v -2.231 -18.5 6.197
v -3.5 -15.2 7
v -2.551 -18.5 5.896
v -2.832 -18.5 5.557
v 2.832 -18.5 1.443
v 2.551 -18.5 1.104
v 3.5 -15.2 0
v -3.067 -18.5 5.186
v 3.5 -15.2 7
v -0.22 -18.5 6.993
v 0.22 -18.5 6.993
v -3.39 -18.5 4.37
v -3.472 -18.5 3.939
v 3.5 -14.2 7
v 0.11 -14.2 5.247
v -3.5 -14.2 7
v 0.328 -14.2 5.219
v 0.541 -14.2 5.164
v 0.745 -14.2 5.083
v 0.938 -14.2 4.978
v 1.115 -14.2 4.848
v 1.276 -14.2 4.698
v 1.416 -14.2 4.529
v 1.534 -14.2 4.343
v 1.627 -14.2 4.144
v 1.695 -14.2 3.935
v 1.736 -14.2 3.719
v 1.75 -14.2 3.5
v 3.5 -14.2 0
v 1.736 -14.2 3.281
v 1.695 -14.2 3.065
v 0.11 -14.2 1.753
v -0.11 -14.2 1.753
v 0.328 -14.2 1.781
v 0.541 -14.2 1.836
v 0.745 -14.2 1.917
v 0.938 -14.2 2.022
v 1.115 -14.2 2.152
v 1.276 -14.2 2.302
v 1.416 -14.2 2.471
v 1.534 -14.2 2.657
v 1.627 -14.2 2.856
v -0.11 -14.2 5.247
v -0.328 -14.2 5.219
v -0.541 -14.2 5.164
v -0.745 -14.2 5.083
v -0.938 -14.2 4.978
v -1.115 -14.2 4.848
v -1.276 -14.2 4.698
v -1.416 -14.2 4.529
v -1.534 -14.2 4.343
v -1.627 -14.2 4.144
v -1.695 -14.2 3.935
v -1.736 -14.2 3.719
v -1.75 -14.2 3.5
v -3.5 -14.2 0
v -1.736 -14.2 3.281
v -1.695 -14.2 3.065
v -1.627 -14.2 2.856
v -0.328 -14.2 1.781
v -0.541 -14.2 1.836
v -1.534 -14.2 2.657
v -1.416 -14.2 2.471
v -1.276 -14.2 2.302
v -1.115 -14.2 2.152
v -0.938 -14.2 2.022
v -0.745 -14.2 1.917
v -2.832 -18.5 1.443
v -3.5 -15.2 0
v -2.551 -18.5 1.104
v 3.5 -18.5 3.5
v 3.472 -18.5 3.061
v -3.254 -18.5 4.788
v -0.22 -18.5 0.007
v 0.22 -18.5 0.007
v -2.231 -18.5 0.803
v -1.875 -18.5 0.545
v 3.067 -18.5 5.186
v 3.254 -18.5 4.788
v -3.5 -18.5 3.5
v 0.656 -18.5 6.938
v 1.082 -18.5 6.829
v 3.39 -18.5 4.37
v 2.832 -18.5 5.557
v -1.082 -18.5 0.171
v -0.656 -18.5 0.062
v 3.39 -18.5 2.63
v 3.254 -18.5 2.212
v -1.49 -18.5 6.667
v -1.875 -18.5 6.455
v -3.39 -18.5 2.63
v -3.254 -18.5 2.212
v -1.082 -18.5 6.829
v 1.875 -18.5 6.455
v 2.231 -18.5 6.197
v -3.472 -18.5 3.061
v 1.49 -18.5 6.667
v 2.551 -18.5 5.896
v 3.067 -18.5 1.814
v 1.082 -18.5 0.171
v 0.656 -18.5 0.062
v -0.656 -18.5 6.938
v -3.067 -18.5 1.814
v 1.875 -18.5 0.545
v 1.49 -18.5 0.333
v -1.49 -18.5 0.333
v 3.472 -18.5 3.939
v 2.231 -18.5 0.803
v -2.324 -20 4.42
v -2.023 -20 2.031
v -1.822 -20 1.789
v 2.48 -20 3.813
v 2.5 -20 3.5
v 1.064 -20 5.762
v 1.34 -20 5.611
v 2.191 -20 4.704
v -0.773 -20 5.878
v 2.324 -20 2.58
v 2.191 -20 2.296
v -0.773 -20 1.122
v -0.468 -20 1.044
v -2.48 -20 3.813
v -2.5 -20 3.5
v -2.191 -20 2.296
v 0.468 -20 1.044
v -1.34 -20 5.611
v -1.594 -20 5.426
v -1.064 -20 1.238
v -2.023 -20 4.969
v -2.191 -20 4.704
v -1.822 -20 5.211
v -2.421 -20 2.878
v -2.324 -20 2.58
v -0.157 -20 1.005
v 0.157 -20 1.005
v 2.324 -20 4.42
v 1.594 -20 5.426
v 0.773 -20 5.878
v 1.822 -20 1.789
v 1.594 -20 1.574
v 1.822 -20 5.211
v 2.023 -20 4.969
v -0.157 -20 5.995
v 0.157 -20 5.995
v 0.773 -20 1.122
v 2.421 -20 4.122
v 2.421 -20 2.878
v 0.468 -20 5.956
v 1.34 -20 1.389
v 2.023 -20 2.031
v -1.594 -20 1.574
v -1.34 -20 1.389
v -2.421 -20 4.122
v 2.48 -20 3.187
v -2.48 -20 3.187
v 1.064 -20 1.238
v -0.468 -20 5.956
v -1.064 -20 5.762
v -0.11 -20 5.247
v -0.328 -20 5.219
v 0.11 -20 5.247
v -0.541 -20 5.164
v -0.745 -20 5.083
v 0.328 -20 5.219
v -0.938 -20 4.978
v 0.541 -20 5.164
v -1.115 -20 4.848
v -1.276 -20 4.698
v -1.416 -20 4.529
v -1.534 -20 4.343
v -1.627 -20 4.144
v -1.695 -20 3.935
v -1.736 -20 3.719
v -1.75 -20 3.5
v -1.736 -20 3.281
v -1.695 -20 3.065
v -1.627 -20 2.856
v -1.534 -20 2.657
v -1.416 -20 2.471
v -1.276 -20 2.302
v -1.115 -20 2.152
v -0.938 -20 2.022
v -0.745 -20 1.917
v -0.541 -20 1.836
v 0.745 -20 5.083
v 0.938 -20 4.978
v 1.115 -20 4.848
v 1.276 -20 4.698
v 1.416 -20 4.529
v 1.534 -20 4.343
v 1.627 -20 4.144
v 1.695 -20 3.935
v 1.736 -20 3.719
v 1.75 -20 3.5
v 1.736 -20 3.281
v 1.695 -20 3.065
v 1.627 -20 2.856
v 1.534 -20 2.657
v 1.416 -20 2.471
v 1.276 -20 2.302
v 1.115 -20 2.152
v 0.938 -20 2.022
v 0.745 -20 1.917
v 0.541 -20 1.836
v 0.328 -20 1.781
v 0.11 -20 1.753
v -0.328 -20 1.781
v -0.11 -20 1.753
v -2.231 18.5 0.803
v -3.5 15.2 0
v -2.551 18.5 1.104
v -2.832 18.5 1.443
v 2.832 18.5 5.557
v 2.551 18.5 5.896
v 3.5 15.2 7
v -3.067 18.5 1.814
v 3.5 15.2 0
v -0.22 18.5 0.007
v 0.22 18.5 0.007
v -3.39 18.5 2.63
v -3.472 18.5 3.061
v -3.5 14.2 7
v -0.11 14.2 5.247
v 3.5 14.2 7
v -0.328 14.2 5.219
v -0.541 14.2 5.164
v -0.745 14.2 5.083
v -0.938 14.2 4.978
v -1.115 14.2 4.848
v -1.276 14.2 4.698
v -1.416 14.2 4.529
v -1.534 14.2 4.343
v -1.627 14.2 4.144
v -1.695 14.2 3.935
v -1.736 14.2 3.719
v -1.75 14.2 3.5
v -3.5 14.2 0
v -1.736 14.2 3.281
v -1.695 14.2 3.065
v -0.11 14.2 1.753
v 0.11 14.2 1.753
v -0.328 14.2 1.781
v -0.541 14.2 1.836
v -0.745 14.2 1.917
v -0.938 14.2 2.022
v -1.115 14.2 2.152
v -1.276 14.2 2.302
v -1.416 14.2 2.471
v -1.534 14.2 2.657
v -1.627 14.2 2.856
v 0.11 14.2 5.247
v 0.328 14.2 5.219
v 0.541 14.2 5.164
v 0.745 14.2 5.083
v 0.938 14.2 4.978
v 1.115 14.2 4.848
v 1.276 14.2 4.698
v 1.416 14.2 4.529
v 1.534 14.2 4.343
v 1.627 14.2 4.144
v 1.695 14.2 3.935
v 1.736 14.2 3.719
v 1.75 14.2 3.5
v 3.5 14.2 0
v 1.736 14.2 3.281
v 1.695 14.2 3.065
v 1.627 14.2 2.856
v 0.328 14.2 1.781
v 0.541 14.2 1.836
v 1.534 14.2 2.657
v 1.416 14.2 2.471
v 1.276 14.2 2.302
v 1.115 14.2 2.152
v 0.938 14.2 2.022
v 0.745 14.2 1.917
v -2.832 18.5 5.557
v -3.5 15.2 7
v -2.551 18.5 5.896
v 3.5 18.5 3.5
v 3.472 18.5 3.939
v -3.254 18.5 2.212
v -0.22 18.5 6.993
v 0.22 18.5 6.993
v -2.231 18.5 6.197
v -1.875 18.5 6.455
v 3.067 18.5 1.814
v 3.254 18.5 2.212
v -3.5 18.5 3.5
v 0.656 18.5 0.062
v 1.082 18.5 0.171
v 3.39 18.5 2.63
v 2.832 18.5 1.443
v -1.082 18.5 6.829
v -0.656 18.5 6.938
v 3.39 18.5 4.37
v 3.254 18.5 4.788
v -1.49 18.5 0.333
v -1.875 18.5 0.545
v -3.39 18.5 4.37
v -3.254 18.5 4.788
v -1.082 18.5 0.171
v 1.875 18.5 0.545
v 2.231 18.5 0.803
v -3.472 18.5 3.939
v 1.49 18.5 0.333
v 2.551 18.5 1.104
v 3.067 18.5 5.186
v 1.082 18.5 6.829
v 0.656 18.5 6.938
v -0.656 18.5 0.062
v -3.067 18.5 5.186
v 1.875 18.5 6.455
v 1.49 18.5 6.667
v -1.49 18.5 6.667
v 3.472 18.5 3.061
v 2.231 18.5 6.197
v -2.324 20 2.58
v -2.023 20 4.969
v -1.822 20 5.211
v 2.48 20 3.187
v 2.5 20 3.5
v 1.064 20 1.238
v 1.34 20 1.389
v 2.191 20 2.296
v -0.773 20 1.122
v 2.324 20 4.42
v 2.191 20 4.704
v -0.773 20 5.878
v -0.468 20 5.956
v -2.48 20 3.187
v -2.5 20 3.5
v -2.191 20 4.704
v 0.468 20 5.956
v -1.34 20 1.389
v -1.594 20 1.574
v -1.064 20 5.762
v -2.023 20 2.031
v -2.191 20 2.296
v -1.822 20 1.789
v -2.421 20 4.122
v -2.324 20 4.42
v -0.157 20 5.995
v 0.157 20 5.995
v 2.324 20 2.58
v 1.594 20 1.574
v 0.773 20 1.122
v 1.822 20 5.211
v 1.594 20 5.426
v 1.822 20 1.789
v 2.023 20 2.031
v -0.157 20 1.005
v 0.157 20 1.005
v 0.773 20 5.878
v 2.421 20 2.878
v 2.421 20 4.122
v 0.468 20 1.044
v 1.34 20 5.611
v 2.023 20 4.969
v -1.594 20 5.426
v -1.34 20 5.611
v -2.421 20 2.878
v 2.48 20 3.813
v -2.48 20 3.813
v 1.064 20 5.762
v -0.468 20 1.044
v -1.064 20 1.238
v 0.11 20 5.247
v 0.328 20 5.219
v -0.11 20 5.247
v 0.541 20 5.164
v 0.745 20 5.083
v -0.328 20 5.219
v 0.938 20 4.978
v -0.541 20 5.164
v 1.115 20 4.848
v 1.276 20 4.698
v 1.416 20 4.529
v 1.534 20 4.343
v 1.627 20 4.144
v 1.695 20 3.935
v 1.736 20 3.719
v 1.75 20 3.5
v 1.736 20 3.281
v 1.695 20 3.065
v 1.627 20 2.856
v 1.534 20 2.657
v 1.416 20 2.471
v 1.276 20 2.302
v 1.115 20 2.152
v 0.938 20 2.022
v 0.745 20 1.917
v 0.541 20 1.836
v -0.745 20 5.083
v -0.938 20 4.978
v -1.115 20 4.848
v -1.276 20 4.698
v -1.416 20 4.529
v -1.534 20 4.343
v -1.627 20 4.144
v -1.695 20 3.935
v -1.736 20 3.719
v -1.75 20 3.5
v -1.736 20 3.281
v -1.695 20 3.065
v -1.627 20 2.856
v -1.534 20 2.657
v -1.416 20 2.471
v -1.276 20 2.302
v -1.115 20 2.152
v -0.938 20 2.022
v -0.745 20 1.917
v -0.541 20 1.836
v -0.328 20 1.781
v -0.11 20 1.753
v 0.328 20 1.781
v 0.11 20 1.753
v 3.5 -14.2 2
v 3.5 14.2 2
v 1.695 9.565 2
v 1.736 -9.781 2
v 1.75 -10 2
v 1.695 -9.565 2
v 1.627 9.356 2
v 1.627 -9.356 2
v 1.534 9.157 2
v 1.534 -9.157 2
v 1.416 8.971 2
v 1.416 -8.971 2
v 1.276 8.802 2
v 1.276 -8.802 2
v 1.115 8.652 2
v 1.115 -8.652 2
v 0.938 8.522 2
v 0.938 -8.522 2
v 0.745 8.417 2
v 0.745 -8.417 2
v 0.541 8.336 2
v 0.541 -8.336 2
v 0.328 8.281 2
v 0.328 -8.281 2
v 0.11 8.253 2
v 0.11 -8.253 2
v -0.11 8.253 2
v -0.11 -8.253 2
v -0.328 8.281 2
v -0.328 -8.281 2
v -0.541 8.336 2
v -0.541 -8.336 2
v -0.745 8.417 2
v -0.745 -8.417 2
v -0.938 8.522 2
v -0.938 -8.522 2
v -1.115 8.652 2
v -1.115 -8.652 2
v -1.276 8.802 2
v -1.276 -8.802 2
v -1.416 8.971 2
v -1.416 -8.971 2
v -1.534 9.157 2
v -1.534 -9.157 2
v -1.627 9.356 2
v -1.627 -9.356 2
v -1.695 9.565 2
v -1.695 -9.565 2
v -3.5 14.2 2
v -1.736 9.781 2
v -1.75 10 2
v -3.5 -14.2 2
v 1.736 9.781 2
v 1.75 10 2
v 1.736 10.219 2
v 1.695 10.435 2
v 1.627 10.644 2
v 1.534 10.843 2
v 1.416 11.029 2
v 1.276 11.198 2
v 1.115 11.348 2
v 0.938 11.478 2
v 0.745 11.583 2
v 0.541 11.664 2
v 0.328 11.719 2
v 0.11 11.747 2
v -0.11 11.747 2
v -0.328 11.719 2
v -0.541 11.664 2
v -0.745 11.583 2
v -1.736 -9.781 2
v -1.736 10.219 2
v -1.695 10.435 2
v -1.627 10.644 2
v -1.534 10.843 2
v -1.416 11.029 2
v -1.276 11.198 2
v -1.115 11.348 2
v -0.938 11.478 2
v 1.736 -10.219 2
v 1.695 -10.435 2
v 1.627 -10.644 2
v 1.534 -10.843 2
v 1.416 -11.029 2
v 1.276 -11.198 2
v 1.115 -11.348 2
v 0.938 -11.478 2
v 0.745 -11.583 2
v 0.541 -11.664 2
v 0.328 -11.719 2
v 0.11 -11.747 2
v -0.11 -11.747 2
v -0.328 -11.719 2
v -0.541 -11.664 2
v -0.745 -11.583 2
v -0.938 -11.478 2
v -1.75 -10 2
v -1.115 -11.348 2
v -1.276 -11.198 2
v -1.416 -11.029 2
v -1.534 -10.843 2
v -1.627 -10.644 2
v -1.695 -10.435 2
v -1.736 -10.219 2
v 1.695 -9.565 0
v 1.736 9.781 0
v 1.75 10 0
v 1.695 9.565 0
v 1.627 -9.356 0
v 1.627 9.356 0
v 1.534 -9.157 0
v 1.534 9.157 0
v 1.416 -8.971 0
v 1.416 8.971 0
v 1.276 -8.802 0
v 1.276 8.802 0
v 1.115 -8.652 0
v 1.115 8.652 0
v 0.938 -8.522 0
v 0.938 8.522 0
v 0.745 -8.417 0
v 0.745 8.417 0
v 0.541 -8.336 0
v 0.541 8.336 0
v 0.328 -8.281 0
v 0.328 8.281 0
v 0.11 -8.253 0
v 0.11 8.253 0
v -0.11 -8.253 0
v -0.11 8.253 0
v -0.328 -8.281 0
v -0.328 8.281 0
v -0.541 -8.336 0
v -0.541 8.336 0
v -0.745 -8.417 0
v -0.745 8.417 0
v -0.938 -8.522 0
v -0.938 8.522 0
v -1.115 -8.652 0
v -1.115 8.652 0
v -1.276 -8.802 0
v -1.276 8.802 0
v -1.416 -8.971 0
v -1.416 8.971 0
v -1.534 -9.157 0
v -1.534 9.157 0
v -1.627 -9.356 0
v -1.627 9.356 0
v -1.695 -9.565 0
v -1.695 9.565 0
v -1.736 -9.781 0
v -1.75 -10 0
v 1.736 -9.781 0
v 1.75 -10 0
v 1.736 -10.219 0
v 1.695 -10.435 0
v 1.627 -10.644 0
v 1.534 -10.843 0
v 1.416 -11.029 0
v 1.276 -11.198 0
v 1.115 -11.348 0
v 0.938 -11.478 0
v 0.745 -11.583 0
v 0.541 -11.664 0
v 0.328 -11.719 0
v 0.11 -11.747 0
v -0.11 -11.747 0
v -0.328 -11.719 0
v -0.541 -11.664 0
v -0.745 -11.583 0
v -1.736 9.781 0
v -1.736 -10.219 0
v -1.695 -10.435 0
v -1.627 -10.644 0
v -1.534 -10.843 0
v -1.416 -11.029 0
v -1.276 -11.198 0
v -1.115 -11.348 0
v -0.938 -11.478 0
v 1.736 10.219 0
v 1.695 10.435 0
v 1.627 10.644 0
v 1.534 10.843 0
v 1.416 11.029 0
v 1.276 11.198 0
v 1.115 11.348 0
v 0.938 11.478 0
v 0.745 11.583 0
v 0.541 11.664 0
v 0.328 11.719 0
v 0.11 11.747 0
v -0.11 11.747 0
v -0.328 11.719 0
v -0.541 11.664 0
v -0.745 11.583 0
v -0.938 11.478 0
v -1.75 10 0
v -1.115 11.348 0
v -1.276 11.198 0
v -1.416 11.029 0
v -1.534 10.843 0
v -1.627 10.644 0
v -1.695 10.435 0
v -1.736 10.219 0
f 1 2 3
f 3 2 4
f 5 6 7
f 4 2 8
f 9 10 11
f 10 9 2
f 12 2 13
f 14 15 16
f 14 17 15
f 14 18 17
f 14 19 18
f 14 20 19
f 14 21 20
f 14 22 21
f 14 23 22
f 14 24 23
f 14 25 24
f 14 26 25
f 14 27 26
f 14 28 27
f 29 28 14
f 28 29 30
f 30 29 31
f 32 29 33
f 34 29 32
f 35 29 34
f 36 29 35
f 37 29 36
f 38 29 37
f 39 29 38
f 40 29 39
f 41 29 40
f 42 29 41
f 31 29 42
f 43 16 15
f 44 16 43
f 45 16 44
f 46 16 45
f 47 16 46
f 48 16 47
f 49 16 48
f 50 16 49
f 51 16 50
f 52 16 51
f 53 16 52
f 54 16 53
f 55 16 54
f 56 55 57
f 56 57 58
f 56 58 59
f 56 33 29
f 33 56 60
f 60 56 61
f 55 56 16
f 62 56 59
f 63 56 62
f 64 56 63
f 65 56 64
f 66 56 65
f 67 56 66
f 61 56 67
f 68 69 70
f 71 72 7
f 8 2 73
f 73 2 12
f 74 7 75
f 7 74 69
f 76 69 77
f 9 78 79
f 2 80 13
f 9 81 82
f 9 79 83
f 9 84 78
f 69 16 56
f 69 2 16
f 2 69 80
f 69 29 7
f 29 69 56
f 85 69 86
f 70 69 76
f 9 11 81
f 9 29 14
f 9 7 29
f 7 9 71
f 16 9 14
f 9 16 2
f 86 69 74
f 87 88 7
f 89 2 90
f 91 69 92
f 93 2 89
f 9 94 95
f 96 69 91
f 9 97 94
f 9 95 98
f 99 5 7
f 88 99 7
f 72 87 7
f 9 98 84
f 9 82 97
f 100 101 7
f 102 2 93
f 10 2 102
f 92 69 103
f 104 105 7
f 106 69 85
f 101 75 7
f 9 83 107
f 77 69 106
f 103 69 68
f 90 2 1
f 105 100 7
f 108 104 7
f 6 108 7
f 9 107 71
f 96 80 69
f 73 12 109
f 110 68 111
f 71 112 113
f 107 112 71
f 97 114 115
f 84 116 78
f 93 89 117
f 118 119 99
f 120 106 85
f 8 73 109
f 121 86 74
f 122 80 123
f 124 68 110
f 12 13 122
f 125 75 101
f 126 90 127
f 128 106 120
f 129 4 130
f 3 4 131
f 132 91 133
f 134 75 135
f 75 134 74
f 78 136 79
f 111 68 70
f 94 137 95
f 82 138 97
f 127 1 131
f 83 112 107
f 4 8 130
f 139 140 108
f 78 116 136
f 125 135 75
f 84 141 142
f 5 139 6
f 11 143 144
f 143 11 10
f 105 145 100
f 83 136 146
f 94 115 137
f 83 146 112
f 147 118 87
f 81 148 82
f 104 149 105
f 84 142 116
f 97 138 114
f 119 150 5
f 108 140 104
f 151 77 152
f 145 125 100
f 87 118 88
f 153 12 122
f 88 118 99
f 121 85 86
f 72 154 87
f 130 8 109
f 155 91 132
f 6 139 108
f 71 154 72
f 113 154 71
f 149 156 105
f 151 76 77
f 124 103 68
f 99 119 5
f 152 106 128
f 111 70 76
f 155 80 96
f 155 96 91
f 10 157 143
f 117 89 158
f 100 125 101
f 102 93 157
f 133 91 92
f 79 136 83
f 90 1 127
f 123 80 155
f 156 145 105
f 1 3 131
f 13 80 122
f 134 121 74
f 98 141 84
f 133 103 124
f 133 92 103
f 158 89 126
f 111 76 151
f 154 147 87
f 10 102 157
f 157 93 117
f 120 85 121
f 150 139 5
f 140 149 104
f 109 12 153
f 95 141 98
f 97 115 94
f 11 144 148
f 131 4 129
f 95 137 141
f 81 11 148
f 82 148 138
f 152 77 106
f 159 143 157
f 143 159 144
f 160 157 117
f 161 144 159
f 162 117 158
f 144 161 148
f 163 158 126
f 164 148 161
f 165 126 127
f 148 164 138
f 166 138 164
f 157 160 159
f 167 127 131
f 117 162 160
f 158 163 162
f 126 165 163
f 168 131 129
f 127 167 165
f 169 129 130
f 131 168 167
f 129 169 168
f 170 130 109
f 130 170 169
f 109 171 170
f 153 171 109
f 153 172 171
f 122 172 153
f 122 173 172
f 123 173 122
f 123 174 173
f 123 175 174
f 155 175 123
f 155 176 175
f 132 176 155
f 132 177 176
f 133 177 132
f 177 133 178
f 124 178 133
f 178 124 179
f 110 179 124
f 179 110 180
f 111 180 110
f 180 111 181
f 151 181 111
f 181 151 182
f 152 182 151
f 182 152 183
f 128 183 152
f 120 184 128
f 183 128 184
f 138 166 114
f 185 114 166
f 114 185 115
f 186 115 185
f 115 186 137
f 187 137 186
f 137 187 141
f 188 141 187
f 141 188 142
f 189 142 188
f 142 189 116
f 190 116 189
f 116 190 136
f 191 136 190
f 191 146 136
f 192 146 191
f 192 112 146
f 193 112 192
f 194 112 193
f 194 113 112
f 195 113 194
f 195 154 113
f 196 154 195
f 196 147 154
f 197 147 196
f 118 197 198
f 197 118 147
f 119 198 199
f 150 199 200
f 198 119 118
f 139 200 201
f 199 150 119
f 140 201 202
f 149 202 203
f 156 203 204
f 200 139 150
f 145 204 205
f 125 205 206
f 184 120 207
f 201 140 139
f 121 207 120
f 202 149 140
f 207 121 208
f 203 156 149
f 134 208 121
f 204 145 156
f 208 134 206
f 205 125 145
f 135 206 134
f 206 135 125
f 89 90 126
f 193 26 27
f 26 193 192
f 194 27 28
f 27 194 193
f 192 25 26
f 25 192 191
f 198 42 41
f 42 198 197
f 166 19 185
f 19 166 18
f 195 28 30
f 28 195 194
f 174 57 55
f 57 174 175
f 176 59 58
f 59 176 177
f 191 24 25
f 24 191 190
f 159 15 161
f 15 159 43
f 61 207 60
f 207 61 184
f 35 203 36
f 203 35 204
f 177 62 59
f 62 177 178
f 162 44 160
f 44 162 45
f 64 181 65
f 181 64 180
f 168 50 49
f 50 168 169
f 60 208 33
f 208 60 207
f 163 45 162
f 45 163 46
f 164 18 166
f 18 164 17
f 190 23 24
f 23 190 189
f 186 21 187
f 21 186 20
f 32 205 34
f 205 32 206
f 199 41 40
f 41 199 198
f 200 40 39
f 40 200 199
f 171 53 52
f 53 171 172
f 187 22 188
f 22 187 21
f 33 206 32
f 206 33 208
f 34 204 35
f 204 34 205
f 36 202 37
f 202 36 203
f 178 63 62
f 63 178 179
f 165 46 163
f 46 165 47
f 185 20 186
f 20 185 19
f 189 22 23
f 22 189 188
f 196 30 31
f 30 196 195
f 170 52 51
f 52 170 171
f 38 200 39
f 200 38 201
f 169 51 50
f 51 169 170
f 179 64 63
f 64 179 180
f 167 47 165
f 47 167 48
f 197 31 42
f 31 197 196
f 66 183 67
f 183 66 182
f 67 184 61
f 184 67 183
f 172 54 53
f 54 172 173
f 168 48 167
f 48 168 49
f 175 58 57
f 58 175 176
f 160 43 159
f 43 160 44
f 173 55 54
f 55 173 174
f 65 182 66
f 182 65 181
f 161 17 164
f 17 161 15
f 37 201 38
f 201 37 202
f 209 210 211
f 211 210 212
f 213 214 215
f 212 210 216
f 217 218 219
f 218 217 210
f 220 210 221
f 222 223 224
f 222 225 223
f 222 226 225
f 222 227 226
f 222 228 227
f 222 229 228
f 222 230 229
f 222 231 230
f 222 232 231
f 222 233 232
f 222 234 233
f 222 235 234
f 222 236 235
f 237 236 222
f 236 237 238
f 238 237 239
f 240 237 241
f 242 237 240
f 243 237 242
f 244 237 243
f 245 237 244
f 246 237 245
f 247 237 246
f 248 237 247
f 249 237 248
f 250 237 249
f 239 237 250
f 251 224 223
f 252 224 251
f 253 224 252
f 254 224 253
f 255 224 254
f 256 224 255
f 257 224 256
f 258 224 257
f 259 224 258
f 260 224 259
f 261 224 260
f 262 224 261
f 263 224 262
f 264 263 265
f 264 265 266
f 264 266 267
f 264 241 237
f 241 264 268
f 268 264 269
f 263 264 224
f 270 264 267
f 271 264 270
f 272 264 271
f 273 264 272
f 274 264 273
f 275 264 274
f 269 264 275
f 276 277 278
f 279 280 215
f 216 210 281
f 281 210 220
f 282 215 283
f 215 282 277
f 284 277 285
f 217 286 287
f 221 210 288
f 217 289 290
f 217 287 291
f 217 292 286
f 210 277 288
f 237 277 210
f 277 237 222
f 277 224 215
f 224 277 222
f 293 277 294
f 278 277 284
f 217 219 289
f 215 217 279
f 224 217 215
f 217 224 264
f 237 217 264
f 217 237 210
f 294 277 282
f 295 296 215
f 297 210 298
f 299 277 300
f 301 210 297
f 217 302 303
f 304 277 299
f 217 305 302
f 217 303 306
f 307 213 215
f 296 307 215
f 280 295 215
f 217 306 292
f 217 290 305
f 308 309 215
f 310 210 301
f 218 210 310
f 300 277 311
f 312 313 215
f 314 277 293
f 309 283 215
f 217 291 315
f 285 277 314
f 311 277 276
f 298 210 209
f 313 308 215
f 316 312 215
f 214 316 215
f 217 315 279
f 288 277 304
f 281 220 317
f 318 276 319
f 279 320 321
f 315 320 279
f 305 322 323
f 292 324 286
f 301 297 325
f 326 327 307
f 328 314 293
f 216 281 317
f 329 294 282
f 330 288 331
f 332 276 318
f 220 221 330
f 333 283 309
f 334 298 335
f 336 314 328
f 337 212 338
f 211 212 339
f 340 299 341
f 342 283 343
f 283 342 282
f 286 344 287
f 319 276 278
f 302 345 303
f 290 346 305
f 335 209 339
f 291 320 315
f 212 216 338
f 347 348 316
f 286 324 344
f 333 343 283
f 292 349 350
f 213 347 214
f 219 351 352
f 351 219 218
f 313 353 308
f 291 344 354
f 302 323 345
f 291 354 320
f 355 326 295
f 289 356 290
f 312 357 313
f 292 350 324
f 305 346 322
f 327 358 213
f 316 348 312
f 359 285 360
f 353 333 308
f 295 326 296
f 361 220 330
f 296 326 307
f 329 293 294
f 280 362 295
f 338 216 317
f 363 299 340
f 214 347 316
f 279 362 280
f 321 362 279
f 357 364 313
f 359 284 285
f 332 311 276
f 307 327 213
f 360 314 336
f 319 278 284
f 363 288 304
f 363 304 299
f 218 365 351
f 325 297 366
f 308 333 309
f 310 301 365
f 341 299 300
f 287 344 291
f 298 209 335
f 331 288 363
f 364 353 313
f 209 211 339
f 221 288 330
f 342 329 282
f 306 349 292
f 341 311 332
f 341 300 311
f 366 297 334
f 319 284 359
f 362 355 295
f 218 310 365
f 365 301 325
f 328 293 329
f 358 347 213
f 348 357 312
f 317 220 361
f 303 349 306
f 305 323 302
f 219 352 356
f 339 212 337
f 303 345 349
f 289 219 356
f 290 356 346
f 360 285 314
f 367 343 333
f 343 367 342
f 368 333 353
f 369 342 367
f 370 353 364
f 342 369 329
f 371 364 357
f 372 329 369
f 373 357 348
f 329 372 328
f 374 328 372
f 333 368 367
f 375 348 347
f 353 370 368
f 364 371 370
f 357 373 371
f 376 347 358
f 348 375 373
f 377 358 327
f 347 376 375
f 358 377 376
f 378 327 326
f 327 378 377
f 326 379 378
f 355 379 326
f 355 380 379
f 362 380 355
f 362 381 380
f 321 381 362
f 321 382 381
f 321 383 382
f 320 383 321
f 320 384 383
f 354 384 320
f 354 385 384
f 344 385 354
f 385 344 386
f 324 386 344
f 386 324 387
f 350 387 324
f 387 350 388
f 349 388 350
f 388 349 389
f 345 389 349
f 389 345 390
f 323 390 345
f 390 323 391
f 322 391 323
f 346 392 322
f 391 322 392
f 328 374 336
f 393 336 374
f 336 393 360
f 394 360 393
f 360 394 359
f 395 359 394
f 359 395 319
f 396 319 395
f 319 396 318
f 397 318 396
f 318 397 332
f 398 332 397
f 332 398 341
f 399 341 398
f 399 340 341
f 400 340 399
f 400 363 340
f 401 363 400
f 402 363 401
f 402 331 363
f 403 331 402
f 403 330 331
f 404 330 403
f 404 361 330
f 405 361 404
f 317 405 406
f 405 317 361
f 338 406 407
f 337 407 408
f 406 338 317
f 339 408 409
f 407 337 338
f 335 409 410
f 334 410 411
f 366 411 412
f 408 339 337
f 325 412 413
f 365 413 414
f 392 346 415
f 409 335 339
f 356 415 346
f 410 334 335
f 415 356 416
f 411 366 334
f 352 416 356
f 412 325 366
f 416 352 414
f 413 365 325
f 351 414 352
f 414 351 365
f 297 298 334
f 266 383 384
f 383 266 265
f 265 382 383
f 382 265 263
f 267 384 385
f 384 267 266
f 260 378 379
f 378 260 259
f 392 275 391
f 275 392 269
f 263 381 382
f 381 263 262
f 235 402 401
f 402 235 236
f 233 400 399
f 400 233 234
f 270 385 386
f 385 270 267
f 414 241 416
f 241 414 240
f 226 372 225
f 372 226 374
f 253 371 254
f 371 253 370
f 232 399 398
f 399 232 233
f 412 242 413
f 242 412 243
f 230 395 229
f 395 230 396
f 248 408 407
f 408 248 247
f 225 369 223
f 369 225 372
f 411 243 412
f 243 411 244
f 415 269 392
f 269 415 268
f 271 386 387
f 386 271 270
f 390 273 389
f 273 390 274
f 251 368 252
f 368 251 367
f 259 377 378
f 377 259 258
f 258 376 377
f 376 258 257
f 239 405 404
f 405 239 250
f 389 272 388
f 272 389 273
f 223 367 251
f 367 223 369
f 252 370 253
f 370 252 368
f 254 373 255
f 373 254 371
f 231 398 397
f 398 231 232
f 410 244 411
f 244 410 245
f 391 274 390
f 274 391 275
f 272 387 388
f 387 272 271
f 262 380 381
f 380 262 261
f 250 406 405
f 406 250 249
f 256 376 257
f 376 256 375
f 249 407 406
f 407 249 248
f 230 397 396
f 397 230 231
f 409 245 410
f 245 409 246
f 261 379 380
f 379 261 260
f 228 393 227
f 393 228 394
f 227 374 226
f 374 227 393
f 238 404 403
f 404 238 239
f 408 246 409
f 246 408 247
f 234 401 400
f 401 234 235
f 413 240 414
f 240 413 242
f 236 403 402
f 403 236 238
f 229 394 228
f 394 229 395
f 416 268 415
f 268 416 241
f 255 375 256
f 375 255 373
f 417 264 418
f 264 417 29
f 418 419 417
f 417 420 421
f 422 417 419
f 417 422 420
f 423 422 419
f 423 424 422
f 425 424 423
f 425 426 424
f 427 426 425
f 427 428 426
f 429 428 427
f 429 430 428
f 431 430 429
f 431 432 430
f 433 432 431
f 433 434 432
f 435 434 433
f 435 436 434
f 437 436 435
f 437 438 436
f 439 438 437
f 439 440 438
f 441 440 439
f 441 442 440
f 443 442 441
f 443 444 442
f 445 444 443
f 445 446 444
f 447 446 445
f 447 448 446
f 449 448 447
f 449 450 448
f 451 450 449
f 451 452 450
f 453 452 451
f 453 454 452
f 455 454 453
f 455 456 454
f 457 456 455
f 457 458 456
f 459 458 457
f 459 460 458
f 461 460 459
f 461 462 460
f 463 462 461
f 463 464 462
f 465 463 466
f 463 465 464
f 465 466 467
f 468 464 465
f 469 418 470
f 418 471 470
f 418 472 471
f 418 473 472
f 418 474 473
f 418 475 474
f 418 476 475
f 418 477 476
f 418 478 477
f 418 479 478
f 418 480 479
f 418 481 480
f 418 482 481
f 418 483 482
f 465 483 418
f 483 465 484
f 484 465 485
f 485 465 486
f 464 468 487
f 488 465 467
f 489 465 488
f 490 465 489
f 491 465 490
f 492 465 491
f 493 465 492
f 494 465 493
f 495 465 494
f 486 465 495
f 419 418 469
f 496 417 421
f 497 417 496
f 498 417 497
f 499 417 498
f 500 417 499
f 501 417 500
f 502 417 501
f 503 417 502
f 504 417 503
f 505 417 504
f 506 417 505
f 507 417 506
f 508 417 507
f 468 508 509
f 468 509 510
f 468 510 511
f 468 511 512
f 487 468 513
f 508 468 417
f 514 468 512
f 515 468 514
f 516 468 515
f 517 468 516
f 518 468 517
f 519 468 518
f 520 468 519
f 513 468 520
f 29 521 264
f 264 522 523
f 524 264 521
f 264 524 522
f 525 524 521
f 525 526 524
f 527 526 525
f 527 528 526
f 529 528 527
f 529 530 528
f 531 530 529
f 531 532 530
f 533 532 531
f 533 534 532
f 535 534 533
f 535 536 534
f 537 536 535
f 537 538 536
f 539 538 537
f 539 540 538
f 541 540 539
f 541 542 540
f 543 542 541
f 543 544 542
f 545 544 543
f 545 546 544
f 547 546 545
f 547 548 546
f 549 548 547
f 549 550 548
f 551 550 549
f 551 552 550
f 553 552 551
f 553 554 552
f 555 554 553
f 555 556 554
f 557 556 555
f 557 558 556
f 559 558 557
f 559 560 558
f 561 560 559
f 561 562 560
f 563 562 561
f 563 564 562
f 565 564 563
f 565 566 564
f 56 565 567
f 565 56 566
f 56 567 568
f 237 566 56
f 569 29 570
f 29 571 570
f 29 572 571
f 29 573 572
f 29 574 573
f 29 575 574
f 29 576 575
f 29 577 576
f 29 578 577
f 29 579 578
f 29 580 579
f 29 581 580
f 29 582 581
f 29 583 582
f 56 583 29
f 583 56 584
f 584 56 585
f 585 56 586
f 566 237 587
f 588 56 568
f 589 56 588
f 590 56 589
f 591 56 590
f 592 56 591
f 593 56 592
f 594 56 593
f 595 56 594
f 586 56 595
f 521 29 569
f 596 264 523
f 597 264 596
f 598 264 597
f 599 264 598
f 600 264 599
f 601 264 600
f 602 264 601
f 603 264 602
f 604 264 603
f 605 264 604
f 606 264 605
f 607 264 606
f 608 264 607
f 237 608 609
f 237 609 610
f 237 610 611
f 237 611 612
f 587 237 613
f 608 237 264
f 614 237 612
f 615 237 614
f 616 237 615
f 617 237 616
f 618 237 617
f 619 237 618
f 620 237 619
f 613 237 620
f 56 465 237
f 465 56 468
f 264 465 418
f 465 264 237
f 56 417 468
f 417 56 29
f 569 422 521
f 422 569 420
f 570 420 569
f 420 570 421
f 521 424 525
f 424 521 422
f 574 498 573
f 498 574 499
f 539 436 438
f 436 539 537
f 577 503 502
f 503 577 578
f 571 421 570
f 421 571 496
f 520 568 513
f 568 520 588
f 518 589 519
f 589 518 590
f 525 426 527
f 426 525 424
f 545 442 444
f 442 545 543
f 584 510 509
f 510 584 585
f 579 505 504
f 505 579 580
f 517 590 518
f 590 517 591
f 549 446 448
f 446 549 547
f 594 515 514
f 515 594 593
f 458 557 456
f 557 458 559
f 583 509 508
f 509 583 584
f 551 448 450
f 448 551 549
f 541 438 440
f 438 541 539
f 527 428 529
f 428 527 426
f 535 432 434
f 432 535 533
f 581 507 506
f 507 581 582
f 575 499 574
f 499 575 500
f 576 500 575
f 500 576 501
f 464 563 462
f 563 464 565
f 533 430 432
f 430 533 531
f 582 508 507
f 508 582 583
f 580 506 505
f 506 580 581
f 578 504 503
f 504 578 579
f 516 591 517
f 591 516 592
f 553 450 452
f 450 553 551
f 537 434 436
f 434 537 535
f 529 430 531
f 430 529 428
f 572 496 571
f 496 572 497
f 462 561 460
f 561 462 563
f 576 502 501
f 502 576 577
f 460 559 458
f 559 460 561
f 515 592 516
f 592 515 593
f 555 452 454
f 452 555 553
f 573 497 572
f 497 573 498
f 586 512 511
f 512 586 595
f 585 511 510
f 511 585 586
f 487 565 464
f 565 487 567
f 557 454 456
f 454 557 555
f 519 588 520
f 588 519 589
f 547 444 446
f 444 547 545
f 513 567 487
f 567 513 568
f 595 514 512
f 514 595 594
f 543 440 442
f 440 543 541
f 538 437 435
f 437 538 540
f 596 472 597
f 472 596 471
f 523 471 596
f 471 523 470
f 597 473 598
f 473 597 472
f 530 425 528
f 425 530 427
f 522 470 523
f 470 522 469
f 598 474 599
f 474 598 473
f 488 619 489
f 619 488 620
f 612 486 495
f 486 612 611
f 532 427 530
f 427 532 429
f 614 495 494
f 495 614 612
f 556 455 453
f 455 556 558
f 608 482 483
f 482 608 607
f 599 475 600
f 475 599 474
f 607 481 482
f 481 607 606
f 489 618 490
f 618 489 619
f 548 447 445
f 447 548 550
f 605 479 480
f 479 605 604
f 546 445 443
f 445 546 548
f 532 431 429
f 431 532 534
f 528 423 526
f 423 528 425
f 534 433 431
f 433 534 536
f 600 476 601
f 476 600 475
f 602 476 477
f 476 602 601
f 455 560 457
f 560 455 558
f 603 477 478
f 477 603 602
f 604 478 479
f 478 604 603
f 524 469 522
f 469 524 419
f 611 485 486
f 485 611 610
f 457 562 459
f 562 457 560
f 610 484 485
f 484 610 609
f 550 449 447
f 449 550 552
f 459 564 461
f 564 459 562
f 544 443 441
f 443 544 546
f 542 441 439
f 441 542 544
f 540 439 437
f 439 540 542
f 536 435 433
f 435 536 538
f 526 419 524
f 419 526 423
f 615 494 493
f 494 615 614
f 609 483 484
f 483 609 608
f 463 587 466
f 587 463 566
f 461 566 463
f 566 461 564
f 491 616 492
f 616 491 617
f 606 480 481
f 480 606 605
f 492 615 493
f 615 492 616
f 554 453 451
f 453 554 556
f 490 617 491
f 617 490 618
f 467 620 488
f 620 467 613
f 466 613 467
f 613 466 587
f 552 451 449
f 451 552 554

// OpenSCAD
WIDTH = 40;

ROD_MOUNT_DIA = 7;
ROD_MOUNT_INTERFACE_DIA = 5;
ROD_MOUNT_INTERFACE_LENGTH = 1.5;
ROD_MOUNT_LENGTH = 5.8;

ROD_HOLE_DIA = 3.5;

BAR_THICKNESS = 2;
BAR_WIDTH = ROD_MOUNT_DIA;
BAR_LENGTH = WIDTH - 2 * ROD_MOUNT_LENGTH;

MOUNT_HOLE_SPACING = 20;
MOUNT_HOLE_DIA = 3.5;

$fn = 50;

module rod_mount() {
  difference() {
    union() {
       hull() {
        translate([0, 0, 0.5])
        cube([BAR_WIDTH, BAR_WIDTH, 1], center = true);
        cylinder(d = ROD_MOUNT_DIA, h = ROD_MOUNT_LENGTH - ROD_MOUNT_INTERFACE_LENGTH);
       }
       translate([0, 0, ROD_MOUNT_LENGTH - ROD_MOUNT_INTERFACE_LENGTH])
       cylinder(d1 = ROD_MOUNT_DIA, d2 = ROD_MOUNT_INTERFACE_DIA, h = ROD_MOUNT_INTERFACE_LENGTH);
    }

    #cylinder(d = ROD_HOLE_DIA, h = ROD_MOUNT_LENGTH);
  }
}

difference() {
  union() {
    translate([0, 0, BAR_THICKNESS/2])
    cube([BAR_WIDTH, BAR_LENGTH, BAR_THICKNESS], center = true);

    for(i = [-1, 1]) {
      translate([0, i * BAR_LENGTH/2, ROD_MOUNT_DIA/2])
      rotate([i * -90, 0, 0])
      rod_mount();
    }
  }

  #for(i = [-1, 1]) {
    translate([0, i * MOUNT_HOLE_SPACING/2, 0])
    cylinder(d = MOUNT_HOLE_DIA, h = BAR_THICKNESS);
  }
}
